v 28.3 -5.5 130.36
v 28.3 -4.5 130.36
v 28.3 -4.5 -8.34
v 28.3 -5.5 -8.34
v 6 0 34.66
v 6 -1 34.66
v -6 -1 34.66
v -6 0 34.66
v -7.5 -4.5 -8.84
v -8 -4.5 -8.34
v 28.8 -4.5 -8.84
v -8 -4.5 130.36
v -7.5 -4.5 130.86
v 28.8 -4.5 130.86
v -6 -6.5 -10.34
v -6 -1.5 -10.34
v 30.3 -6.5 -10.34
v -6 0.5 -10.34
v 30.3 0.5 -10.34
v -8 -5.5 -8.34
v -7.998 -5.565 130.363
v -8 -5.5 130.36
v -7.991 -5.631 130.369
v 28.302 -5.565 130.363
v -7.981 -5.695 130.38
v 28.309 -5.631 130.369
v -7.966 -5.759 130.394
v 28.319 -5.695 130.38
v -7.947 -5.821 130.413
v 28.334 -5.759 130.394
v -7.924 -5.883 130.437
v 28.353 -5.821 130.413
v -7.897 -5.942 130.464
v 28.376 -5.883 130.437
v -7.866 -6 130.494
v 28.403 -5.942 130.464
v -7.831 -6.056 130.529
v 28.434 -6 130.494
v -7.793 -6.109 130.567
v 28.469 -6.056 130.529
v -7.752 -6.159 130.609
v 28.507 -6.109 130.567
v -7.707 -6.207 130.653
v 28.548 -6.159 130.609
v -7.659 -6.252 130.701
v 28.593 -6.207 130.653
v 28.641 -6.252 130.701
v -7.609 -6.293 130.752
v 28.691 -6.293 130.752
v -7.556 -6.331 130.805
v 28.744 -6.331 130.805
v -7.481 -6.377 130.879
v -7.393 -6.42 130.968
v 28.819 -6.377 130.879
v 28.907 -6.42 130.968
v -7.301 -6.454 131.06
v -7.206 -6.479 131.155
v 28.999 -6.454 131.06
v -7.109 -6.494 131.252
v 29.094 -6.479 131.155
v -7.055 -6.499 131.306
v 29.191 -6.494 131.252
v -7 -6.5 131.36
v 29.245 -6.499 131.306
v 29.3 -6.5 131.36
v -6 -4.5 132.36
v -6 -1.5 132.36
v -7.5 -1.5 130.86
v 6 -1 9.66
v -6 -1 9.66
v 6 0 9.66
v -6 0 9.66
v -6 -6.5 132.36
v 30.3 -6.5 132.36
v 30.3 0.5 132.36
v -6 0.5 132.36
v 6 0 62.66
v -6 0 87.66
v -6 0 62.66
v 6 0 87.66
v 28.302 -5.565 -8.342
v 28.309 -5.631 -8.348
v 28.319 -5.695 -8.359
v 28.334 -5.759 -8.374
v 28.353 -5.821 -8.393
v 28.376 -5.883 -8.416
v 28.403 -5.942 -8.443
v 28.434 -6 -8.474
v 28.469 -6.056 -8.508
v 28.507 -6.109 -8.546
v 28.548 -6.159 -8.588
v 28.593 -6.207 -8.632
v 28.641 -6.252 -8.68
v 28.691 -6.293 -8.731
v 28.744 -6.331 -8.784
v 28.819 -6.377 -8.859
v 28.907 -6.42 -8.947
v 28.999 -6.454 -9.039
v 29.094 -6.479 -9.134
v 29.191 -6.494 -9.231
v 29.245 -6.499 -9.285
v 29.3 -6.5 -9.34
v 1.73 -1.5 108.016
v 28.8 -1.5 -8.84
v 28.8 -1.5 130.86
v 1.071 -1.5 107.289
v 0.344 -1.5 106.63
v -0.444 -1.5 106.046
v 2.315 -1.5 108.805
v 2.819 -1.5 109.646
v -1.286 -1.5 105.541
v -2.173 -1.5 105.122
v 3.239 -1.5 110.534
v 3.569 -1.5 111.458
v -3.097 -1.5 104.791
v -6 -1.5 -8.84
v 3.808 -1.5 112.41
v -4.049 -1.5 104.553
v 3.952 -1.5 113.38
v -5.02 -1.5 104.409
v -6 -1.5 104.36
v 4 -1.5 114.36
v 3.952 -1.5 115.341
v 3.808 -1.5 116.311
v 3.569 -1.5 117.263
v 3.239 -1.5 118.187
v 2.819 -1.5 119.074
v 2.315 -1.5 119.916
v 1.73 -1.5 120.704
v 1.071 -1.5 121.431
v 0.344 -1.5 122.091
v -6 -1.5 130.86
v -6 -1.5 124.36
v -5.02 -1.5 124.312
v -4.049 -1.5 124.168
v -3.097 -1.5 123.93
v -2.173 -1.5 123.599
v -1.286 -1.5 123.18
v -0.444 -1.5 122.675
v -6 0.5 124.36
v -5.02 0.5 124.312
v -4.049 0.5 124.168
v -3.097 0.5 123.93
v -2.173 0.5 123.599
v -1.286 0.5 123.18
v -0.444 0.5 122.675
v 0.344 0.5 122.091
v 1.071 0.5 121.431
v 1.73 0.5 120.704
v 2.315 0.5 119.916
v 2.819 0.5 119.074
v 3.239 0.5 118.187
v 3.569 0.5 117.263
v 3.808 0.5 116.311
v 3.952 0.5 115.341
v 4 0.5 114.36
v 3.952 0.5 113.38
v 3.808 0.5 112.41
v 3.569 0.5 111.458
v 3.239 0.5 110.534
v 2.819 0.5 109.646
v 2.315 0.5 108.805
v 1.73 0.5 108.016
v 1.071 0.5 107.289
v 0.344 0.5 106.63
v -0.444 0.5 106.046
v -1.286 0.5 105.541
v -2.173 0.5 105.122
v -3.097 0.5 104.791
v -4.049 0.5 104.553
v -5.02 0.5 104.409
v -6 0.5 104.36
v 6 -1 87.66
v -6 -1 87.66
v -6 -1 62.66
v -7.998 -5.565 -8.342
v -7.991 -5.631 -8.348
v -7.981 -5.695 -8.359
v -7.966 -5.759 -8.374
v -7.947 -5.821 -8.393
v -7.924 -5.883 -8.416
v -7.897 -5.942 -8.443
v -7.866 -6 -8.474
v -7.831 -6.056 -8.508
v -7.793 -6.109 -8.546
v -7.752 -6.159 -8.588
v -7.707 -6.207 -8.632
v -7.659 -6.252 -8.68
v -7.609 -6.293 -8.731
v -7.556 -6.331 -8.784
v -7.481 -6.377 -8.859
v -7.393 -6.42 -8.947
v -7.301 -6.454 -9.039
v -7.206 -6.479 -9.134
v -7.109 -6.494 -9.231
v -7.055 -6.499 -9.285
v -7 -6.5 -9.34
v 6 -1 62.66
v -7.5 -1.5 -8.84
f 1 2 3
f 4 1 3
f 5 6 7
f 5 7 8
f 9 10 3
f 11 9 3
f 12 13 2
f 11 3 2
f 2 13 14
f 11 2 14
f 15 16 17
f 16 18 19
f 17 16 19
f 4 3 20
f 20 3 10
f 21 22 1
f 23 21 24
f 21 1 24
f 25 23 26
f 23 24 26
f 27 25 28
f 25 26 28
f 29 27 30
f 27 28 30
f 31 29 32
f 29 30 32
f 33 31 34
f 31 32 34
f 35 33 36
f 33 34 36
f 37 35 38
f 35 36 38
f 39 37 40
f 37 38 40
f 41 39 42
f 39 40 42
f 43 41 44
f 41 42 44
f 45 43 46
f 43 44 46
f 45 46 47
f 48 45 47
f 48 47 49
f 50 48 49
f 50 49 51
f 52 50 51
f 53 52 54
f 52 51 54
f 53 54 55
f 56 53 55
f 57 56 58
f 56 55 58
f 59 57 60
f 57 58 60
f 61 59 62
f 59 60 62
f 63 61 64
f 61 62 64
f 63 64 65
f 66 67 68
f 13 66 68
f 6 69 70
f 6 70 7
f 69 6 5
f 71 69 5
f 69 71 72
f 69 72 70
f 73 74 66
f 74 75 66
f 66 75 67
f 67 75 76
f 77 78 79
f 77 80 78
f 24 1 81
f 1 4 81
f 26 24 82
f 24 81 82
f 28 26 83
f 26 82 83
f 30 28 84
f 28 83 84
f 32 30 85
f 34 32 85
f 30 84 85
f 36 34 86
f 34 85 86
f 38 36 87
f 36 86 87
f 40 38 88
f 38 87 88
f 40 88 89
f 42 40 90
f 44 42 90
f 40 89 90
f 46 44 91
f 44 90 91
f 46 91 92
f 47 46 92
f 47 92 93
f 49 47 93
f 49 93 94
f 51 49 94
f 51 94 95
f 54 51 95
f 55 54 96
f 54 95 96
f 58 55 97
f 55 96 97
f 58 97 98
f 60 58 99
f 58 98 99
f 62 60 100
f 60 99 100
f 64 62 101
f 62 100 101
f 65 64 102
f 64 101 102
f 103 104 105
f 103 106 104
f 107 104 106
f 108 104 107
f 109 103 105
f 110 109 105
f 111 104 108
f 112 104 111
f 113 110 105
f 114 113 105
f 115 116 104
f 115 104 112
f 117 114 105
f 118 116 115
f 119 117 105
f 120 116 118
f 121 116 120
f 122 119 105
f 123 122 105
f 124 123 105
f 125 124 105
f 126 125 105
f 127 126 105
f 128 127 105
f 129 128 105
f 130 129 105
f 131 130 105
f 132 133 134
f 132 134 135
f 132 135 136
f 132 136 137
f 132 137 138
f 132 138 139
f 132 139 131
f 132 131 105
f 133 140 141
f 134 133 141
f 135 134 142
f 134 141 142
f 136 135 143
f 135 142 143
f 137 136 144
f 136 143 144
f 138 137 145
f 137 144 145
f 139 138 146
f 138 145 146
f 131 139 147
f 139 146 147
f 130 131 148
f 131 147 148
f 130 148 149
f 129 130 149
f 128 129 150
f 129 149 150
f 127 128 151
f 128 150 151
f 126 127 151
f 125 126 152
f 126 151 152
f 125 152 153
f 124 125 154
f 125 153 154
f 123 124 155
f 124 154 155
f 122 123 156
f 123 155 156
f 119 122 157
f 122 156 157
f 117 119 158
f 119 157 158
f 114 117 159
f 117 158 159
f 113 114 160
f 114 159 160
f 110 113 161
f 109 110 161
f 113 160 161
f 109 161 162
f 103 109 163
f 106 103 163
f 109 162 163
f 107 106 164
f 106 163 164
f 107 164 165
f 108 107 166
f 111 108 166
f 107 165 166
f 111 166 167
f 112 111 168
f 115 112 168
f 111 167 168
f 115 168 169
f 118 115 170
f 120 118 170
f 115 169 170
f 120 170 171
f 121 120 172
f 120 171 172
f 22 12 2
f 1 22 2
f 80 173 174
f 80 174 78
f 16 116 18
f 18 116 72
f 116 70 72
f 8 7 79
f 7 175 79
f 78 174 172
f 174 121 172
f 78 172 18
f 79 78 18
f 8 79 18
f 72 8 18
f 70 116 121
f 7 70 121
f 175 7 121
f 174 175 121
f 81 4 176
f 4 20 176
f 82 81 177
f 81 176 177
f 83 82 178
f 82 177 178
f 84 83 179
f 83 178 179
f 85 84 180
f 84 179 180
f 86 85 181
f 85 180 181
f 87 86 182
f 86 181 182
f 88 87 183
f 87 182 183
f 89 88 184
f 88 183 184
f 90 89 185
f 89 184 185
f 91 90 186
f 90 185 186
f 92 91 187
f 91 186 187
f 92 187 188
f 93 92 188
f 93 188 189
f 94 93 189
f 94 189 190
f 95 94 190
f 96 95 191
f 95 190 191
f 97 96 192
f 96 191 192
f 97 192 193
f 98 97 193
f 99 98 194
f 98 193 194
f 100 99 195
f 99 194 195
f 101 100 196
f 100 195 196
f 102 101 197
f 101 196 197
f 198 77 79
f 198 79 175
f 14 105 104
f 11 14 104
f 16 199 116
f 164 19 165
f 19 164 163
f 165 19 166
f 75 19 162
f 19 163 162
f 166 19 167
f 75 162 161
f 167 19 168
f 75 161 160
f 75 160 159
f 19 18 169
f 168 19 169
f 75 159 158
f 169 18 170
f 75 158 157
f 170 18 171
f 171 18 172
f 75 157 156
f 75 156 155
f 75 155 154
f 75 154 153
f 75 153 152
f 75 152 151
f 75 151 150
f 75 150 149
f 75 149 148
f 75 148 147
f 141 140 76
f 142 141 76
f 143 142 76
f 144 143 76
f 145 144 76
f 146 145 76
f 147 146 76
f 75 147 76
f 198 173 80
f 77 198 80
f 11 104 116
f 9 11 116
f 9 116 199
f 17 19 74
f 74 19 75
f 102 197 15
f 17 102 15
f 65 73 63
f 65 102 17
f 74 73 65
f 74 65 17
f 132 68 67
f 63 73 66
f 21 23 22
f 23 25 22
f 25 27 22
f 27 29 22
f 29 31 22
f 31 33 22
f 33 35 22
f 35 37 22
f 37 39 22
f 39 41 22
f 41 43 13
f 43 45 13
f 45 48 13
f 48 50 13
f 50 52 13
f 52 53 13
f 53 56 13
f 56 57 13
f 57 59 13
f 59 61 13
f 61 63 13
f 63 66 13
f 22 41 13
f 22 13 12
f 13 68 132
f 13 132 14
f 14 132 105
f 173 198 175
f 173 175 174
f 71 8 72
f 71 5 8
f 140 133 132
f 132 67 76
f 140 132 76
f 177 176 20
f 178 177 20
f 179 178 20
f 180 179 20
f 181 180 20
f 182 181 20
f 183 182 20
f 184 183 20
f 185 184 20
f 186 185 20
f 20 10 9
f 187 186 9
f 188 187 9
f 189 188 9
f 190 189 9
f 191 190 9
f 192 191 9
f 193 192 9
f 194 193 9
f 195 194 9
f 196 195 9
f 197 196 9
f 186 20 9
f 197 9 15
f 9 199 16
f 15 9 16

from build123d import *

# Parameters (mm, degrees)
F1_DEPTH = 6
F2_W     = 2
F2_H     = 142.7
F3_DEPTH = 24.3
F5_D     = 20
F7_DEPTH = 3
F9_DEPTH = 2
F10_R    = 1


# Not quite as in the source:
# - ends of sketch curves that miss each other by under 0.0002 mm in the source are joined


with BuildPart() as f1:
    # F0 (on Right) → F1 (new body, symmetric)
    with BuildSketch(Plane.YZ):
        Polygon((0.5, -10.3395825443), (0.5, 132.3604174557), (-0.5, 132.3604174557), (-0.5, 87.6604174557), (0, 87.6604174557), (0, 62.6604174557), (-0.5, 62.6604174557), (-0.5, 34.6604174557), (0, 34.6604174557), (0, 9.6604174557), (-0.5, 9.6604174557), (-0.5, -10.3395825443), align=None)
        Polygon((-0.5, 87.6604174557), (-0.5, 132.3604174557), (-1.5, 132.3604174557), (-1.5, -10.3395825443), (-0.5, -10.3395825443), (-0.5, 9.6604174557), (-1, 9.6604174557), (-1, 34.6604174557), (-0.5, 34.6604174557), (-0.5, 62.6604174557), (-1, 62.6604174557), (-1, 87.6604174557), align=None)
    extrude(amount=F1_DEPTH, both=True)

    # F2 (on face) → F3 (join)
    with BuildSketch(Plane.YZ.offset(6)):
        with Locations((-0.5, 61.0104174557)):
            Rectangle(F2_W, F2_H)
    extrude(amount=F3_DEPTH)

    # F5 (through all)
    with Locations(Plane.XZ.offset(1.5)):
        with Locations((-6, 114.3604174557)):
            Hole(F5_D / 2)

    # F6 (on face) → F7 (join)
    with BuildSketch(Plane.XZ.offset(1.5)):
        Polygon((30.3, 132.3604174557), (-6, 132.3604174557), (-7.5, 130.8604174557), (28.8, 130.8604174557), (28.8, -8.8395825443), (-7.5, -8.8395825443), (-6, -10.3395825443), (30.3, -10.3395825443), align=None)
    extrude(amount=F7_DEPTH)

    # F8 (on face) → F9 (join)
    with BuildSketch(Plane.XZ.offset(4.5)):
        Polygon((-6, -10.3395825443), (30.3, -10.3395825443), (30.3, 132.3604174557), (-6, 132.3604174557), (-8.0000020331, 130.3604154225), (28.3, 130.3604154225), (28.3, -8.3395825443), (-8, -8.3395825443), align=None)
    extrude(amount=F9_DEPTH)

    # F10
    f10_edges = [f1.edges().sort_by_distance(p)[0] for p in [
        (10.15, -6.5, -8.339583),
        (28.3, -6.5, 61.010416),
        (10.149999, -6.5, 130.360415),
    ]]
    fillet(f10_edges, radius=F10_R)


solid = f1.part
